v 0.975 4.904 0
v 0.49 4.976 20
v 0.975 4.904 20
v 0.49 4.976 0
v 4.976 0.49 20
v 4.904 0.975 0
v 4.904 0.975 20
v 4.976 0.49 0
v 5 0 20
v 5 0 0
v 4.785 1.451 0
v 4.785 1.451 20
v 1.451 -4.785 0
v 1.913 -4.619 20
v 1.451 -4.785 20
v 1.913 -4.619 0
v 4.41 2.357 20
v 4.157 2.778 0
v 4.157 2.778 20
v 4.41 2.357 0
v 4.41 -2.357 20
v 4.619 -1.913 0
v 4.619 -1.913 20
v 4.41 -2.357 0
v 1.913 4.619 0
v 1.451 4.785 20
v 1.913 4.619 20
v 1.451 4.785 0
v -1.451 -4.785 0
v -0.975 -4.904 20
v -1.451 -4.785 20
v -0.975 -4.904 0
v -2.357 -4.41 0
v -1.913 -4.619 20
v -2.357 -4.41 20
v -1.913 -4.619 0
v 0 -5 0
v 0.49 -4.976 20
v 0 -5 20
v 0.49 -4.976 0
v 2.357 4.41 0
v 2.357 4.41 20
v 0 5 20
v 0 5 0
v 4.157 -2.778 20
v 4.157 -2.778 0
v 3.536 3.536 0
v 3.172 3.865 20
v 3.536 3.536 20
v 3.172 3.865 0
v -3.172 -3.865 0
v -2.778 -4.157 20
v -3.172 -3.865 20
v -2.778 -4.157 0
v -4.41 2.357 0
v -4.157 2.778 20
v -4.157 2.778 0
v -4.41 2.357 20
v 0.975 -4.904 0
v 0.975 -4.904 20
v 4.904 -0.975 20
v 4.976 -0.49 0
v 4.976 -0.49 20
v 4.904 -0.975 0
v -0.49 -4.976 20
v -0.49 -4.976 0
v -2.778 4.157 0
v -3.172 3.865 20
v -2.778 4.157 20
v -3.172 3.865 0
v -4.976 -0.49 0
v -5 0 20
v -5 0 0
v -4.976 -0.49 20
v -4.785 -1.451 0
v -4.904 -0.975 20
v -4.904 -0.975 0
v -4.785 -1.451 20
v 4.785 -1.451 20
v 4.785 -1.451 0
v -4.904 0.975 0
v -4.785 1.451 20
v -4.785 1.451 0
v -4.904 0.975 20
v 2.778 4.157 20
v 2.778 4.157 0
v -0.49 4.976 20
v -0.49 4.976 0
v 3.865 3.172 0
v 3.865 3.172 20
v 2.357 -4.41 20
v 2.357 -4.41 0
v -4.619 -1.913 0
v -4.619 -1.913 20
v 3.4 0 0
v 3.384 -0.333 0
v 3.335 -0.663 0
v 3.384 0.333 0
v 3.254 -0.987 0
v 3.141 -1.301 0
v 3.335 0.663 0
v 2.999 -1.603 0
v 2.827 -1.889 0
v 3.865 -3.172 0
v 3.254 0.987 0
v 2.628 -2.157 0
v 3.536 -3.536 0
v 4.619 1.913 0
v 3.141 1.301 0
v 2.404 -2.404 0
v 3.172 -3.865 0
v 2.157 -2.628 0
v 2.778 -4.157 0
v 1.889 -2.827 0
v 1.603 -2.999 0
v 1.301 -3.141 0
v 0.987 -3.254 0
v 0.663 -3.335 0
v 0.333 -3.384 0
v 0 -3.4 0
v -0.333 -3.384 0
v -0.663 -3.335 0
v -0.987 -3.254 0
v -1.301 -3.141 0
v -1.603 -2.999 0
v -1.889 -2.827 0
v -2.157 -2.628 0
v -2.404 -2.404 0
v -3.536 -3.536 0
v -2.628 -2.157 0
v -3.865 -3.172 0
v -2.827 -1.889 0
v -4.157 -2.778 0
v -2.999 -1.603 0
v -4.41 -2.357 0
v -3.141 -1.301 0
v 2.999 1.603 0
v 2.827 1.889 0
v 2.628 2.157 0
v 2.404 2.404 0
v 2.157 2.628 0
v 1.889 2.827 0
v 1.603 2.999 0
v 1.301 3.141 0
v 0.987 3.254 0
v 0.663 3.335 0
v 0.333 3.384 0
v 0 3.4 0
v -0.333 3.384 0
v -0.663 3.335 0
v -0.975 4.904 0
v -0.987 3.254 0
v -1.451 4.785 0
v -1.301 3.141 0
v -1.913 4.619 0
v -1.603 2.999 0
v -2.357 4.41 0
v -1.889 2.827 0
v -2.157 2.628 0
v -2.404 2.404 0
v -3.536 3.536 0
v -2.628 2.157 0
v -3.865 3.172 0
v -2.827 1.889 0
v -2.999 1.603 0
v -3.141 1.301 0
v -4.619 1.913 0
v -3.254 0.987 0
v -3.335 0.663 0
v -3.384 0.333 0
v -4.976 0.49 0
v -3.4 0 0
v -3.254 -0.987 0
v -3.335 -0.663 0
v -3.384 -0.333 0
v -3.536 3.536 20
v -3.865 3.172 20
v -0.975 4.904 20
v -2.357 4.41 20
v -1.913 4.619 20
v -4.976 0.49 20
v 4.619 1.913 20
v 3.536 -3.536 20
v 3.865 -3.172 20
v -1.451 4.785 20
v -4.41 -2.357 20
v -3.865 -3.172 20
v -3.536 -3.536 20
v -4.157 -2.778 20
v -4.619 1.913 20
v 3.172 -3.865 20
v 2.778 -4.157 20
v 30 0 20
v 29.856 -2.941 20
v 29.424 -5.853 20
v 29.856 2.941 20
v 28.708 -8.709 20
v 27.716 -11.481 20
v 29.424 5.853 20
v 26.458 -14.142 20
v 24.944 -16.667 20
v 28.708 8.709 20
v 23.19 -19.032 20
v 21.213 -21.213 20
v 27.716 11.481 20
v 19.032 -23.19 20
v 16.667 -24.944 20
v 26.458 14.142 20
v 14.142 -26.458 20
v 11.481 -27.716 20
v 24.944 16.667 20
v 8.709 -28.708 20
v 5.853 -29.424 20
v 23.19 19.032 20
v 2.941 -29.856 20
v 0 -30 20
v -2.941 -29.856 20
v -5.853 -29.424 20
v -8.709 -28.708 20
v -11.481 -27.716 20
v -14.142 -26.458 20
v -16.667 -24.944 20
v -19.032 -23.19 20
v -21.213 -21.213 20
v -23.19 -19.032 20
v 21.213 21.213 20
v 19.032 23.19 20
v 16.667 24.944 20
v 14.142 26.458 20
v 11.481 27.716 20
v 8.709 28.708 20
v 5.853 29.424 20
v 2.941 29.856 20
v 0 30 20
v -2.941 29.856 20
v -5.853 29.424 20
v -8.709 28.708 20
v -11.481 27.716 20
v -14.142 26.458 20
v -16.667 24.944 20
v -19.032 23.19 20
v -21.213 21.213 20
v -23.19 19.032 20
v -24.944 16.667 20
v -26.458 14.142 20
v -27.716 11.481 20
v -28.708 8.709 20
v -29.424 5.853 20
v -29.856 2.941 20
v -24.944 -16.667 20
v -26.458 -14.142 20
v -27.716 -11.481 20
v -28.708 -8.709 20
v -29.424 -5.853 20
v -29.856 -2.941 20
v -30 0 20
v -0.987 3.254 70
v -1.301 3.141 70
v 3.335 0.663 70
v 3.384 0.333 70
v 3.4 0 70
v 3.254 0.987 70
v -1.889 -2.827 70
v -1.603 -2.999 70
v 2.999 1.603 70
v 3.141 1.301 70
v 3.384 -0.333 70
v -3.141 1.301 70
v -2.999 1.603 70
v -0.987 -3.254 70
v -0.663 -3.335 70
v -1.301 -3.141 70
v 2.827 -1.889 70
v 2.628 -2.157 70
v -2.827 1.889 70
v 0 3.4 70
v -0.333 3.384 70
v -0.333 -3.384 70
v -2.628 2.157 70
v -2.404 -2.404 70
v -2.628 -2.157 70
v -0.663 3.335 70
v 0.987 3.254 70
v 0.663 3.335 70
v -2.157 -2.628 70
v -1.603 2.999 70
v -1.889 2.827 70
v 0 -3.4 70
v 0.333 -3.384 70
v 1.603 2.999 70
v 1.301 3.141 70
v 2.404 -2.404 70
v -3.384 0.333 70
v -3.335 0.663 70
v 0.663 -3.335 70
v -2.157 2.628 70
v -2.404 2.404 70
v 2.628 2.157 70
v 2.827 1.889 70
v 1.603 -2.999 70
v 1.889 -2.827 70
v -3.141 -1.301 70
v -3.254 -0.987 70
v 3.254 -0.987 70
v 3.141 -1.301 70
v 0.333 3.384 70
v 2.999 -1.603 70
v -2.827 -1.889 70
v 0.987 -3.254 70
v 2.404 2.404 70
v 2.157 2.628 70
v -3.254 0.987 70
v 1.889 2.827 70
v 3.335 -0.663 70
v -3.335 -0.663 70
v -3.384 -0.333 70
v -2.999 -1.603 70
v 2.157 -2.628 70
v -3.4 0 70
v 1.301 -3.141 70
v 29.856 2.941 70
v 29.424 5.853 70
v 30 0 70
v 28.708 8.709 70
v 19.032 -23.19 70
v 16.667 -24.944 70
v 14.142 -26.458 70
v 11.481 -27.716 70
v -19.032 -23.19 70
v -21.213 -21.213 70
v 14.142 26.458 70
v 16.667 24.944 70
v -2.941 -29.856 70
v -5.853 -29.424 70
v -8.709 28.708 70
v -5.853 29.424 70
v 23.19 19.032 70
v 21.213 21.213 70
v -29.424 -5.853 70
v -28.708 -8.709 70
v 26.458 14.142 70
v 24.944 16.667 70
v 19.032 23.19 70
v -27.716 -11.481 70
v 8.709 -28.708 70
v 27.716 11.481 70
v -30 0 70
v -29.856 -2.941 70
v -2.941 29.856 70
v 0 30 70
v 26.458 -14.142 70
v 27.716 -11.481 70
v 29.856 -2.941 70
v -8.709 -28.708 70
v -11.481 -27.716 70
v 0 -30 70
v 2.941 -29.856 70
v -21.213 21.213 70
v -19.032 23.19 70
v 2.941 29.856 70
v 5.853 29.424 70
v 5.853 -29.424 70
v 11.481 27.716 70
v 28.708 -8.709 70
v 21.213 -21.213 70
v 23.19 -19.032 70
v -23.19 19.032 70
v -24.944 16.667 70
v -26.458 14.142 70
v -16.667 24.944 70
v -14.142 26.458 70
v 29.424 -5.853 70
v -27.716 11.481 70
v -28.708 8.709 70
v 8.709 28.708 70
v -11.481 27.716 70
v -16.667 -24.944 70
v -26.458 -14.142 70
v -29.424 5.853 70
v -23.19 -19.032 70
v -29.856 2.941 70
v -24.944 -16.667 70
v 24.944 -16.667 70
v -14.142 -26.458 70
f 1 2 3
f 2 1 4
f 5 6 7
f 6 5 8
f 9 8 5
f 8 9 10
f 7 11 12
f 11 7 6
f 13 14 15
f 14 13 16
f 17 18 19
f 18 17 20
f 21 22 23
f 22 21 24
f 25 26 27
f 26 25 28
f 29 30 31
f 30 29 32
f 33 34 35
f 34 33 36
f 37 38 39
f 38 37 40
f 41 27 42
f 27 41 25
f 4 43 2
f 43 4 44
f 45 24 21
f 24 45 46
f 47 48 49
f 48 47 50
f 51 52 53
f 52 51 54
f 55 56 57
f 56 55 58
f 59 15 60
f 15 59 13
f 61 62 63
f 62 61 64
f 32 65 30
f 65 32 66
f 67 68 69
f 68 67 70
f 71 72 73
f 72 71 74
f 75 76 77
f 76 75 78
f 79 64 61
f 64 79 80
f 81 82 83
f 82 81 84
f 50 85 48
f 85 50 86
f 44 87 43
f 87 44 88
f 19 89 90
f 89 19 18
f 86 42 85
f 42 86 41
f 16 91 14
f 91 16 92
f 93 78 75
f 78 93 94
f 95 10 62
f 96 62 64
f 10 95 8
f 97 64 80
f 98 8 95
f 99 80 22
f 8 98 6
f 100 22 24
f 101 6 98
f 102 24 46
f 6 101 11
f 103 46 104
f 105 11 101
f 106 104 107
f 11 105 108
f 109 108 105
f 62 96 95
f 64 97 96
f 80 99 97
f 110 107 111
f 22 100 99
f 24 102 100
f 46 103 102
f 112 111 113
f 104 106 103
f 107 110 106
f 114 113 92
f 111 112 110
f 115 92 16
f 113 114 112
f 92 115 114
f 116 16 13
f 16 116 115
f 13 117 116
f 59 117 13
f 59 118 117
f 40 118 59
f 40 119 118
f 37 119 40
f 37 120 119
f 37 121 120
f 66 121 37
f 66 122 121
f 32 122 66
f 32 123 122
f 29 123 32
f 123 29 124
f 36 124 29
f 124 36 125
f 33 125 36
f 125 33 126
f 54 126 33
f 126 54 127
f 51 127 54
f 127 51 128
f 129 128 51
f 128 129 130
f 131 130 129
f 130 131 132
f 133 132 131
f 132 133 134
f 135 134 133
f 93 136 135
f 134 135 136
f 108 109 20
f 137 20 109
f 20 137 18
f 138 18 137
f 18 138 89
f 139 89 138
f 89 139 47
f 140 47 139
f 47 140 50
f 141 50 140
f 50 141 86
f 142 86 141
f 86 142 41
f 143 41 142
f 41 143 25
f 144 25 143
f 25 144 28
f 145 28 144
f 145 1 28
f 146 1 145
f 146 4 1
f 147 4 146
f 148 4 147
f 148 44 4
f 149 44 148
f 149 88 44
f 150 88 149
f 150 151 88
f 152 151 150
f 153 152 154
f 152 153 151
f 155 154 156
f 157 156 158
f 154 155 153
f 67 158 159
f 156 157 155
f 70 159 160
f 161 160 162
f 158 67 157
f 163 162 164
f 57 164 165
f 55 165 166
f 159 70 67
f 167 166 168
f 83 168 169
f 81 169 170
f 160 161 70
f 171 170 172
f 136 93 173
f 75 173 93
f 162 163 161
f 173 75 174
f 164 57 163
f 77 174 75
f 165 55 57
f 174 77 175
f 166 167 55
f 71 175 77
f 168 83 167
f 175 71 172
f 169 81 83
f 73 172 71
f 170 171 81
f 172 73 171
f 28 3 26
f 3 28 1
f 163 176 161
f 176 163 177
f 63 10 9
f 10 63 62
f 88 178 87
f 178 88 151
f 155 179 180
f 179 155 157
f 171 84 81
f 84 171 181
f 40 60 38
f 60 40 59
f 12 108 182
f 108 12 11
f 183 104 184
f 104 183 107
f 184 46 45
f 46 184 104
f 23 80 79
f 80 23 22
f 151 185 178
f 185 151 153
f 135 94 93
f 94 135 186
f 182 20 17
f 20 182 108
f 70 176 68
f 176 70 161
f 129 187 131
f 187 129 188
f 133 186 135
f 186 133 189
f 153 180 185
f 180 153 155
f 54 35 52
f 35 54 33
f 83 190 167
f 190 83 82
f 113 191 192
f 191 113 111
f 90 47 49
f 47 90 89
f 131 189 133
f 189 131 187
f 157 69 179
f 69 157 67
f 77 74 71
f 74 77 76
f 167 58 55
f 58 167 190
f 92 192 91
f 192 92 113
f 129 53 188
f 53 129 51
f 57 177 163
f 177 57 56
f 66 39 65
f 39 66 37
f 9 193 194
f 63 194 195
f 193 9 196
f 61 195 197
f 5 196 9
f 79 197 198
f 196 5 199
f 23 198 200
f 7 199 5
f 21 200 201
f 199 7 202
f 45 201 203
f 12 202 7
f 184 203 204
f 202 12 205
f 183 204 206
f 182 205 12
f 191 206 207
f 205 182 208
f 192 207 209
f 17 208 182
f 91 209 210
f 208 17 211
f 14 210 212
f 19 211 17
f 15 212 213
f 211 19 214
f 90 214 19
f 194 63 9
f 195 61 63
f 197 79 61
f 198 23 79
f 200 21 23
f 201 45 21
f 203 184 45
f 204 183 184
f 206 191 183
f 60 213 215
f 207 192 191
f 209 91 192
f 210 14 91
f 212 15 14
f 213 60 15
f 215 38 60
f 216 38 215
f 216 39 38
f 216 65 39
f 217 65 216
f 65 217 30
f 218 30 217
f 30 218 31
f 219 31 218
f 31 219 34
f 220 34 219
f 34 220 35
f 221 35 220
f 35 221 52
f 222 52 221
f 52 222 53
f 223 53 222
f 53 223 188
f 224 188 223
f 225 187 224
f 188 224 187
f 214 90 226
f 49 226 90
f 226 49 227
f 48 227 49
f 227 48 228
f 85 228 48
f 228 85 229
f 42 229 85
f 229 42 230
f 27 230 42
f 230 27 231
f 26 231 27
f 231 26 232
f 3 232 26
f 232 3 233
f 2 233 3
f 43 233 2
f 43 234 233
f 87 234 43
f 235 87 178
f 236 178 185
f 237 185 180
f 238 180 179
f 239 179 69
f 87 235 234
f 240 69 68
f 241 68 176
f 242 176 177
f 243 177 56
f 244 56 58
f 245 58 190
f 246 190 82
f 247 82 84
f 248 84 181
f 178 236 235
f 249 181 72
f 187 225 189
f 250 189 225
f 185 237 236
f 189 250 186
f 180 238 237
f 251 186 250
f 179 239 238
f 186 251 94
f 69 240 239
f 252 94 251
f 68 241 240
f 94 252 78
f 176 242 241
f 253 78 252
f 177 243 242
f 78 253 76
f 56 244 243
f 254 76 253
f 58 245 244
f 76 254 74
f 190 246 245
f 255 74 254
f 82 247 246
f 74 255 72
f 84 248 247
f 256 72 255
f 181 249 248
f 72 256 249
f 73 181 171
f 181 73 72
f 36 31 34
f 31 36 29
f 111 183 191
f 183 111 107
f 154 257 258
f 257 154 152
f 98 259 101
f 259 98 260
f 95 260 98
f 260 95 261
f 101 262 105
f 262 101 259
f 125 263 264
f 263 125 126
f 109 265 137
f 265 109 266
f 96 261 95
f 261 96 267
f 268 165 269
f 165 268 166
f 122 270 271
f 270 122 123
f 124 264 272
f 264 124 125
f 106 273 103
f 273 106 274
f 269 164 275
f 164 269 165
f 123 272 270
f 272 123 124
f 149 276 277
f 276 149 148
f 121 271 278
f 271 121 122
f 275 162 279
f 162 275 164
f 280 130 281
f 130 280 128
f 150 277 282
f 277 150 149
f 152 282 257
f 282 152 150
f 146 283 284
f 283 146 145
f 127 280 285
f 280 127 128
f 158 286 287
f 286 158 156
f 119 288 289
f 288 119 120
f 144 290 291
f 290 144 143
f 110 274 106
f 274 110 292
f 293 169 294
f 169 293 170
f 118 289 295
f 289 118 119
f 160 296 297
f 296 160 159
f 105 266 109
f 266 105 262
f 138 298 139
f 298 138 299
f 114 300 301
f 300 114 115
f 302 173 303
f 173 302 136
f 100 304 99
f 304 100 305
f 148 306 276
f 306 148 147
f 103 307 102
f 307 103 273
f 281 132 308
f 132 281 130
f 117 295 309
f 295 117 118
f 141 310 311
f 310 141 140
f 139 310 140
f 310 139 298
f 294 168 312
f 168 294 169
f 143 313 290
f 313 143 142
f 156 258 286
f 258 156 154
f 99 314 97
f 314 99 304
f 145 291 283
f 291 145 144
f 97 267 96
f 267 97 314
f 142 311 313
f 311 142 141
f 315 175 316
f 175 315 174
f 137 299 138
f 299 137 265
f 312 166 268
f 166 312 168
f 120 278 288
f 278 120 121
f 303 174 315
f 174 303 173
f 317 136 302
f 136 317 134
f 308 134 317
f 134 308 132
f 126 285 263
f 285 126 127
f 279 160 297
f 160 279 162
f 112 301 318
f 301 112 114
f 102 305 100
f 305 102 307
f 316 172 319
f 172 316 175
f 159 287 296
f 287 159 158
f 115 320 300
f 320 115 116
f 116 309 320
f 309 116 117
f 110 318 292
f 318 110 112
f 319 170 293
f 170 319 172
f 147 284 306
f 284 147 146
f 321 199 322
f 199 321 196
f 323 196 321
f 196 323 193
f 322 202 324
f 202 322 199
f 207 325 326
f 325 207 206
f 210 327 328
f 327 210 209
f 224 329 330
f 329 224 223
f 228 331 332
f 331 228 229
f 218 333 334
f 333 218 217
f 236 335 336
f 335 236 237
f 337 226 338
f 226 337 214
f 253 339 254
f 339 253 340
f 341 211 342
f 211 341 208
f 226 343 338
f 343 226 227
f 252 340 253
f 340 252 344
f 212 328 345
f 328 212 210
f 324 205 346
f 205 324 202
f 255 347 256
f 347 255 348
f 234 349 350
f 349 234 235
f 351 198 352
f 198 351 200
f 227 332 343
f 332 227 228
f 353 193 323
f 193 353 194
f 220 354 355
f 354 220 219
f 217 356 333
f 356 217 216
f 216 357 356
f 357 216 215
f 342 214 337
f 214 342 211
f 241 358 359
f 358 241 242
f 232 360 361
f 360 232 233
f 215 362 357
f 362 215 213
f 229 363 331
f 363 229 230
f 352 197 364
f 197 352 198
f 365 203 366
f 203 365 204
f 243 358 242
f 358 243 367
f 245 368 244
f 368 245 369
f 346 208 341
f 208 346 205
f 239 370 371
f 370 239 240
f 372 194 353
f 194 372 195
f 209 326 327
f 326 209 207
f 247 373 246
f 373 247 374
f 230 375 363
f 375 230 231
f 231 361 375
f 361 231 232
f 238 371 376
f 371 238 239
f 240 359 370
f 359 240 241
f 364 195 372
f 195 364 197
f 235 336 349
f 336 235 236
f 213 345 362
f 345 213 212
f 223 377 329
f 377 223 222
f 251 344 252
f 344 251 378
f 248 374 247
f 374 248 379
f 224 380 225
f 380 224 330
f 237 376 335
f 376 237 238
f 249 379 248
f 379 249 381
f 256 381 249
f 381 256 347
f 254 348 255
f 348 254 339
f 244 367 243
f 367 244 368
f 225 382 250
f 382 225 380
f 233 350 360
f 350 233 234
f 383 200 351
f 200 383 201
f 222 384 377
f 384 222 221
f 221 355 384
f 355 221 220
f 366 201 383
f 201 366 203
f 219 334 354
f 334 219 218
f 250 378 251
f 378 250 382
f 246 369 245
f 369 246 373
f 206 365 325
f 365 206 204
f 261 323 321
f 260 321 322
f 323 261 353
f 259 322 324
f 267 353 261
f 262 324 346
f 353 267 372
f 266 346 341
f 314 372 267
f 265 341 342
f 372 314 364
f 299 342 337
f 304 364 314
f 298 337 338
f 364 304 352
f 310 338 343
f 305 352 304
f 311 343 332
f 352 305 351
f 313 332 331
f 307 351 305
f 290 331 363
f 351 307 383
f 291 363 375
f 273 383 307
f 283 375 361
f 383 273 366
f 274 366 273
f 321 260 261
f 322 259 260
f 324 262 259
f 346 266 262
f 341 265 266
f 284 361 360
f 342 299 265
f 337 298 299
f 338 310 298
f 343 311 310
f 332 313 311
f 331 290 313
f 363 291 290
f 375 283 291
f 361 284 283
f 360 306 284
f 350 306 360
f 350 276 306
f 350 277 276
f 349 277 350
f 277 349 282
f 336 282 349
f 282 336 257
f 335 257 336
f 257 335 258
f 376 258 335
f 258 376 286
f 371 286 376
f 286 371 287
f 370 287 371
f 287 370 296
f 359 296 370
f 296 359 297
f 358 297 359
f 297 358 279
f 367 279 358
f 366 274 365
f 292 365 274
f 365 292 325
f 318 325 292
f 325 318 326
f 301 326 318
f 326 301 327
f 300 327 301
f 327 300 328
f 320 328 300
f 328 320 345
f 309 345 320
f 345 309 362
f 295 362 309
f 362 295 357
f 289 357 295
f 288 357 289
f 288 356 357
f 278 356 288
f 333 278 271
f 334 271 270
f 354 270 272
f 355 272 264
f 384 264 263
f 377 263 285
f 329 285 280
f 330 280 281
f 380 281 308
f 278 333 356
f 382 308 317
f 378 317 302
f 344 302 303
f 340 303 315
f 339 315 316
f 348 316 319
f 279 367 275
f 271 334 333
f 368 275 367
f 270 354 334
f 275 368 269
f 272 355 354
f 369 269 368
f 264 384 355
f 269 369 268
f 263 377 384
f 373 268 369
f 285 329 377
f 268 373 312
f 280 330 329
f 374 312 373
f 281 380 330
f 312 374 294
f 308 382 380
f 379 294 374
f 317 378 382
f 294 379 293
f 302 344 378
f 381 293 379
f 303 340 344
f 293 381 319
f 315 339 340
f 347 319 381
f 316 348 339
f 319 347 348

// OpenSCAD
// Funnel - a spout (tube) sitting in a cone, open at both ends. NOVEL general part.
//

spout_d  = 10;
spout_l  = 20;
cone_top = 10;
cone_rim = 60;
wall     = 1.6;

$fn = 64;

ib = max(1.6, spout_d - 2 * wall);   // keep a bore even if the wall is thicker than the wall

translate([0, 0, 0])
union() {
    difference() {
        cylinder(h = spout_l, d = spout_d);                 // spout (solid)
        translate([0, 0, -1]) cylinder(h = spout_l + 2, d = ib);   // bore through the spout
    }
    translate([0, 0, spout_l])
        difference() {
            cylinder(h = cone_rim - cone_top, d = cone_rim);                 // cone (solid)
            translate([0, 0, -1]) cylinder(h = cone_rim - cone_top + 2, d = spout_d - 2 * wall);   // open the cone for the spout bore
        }
}
